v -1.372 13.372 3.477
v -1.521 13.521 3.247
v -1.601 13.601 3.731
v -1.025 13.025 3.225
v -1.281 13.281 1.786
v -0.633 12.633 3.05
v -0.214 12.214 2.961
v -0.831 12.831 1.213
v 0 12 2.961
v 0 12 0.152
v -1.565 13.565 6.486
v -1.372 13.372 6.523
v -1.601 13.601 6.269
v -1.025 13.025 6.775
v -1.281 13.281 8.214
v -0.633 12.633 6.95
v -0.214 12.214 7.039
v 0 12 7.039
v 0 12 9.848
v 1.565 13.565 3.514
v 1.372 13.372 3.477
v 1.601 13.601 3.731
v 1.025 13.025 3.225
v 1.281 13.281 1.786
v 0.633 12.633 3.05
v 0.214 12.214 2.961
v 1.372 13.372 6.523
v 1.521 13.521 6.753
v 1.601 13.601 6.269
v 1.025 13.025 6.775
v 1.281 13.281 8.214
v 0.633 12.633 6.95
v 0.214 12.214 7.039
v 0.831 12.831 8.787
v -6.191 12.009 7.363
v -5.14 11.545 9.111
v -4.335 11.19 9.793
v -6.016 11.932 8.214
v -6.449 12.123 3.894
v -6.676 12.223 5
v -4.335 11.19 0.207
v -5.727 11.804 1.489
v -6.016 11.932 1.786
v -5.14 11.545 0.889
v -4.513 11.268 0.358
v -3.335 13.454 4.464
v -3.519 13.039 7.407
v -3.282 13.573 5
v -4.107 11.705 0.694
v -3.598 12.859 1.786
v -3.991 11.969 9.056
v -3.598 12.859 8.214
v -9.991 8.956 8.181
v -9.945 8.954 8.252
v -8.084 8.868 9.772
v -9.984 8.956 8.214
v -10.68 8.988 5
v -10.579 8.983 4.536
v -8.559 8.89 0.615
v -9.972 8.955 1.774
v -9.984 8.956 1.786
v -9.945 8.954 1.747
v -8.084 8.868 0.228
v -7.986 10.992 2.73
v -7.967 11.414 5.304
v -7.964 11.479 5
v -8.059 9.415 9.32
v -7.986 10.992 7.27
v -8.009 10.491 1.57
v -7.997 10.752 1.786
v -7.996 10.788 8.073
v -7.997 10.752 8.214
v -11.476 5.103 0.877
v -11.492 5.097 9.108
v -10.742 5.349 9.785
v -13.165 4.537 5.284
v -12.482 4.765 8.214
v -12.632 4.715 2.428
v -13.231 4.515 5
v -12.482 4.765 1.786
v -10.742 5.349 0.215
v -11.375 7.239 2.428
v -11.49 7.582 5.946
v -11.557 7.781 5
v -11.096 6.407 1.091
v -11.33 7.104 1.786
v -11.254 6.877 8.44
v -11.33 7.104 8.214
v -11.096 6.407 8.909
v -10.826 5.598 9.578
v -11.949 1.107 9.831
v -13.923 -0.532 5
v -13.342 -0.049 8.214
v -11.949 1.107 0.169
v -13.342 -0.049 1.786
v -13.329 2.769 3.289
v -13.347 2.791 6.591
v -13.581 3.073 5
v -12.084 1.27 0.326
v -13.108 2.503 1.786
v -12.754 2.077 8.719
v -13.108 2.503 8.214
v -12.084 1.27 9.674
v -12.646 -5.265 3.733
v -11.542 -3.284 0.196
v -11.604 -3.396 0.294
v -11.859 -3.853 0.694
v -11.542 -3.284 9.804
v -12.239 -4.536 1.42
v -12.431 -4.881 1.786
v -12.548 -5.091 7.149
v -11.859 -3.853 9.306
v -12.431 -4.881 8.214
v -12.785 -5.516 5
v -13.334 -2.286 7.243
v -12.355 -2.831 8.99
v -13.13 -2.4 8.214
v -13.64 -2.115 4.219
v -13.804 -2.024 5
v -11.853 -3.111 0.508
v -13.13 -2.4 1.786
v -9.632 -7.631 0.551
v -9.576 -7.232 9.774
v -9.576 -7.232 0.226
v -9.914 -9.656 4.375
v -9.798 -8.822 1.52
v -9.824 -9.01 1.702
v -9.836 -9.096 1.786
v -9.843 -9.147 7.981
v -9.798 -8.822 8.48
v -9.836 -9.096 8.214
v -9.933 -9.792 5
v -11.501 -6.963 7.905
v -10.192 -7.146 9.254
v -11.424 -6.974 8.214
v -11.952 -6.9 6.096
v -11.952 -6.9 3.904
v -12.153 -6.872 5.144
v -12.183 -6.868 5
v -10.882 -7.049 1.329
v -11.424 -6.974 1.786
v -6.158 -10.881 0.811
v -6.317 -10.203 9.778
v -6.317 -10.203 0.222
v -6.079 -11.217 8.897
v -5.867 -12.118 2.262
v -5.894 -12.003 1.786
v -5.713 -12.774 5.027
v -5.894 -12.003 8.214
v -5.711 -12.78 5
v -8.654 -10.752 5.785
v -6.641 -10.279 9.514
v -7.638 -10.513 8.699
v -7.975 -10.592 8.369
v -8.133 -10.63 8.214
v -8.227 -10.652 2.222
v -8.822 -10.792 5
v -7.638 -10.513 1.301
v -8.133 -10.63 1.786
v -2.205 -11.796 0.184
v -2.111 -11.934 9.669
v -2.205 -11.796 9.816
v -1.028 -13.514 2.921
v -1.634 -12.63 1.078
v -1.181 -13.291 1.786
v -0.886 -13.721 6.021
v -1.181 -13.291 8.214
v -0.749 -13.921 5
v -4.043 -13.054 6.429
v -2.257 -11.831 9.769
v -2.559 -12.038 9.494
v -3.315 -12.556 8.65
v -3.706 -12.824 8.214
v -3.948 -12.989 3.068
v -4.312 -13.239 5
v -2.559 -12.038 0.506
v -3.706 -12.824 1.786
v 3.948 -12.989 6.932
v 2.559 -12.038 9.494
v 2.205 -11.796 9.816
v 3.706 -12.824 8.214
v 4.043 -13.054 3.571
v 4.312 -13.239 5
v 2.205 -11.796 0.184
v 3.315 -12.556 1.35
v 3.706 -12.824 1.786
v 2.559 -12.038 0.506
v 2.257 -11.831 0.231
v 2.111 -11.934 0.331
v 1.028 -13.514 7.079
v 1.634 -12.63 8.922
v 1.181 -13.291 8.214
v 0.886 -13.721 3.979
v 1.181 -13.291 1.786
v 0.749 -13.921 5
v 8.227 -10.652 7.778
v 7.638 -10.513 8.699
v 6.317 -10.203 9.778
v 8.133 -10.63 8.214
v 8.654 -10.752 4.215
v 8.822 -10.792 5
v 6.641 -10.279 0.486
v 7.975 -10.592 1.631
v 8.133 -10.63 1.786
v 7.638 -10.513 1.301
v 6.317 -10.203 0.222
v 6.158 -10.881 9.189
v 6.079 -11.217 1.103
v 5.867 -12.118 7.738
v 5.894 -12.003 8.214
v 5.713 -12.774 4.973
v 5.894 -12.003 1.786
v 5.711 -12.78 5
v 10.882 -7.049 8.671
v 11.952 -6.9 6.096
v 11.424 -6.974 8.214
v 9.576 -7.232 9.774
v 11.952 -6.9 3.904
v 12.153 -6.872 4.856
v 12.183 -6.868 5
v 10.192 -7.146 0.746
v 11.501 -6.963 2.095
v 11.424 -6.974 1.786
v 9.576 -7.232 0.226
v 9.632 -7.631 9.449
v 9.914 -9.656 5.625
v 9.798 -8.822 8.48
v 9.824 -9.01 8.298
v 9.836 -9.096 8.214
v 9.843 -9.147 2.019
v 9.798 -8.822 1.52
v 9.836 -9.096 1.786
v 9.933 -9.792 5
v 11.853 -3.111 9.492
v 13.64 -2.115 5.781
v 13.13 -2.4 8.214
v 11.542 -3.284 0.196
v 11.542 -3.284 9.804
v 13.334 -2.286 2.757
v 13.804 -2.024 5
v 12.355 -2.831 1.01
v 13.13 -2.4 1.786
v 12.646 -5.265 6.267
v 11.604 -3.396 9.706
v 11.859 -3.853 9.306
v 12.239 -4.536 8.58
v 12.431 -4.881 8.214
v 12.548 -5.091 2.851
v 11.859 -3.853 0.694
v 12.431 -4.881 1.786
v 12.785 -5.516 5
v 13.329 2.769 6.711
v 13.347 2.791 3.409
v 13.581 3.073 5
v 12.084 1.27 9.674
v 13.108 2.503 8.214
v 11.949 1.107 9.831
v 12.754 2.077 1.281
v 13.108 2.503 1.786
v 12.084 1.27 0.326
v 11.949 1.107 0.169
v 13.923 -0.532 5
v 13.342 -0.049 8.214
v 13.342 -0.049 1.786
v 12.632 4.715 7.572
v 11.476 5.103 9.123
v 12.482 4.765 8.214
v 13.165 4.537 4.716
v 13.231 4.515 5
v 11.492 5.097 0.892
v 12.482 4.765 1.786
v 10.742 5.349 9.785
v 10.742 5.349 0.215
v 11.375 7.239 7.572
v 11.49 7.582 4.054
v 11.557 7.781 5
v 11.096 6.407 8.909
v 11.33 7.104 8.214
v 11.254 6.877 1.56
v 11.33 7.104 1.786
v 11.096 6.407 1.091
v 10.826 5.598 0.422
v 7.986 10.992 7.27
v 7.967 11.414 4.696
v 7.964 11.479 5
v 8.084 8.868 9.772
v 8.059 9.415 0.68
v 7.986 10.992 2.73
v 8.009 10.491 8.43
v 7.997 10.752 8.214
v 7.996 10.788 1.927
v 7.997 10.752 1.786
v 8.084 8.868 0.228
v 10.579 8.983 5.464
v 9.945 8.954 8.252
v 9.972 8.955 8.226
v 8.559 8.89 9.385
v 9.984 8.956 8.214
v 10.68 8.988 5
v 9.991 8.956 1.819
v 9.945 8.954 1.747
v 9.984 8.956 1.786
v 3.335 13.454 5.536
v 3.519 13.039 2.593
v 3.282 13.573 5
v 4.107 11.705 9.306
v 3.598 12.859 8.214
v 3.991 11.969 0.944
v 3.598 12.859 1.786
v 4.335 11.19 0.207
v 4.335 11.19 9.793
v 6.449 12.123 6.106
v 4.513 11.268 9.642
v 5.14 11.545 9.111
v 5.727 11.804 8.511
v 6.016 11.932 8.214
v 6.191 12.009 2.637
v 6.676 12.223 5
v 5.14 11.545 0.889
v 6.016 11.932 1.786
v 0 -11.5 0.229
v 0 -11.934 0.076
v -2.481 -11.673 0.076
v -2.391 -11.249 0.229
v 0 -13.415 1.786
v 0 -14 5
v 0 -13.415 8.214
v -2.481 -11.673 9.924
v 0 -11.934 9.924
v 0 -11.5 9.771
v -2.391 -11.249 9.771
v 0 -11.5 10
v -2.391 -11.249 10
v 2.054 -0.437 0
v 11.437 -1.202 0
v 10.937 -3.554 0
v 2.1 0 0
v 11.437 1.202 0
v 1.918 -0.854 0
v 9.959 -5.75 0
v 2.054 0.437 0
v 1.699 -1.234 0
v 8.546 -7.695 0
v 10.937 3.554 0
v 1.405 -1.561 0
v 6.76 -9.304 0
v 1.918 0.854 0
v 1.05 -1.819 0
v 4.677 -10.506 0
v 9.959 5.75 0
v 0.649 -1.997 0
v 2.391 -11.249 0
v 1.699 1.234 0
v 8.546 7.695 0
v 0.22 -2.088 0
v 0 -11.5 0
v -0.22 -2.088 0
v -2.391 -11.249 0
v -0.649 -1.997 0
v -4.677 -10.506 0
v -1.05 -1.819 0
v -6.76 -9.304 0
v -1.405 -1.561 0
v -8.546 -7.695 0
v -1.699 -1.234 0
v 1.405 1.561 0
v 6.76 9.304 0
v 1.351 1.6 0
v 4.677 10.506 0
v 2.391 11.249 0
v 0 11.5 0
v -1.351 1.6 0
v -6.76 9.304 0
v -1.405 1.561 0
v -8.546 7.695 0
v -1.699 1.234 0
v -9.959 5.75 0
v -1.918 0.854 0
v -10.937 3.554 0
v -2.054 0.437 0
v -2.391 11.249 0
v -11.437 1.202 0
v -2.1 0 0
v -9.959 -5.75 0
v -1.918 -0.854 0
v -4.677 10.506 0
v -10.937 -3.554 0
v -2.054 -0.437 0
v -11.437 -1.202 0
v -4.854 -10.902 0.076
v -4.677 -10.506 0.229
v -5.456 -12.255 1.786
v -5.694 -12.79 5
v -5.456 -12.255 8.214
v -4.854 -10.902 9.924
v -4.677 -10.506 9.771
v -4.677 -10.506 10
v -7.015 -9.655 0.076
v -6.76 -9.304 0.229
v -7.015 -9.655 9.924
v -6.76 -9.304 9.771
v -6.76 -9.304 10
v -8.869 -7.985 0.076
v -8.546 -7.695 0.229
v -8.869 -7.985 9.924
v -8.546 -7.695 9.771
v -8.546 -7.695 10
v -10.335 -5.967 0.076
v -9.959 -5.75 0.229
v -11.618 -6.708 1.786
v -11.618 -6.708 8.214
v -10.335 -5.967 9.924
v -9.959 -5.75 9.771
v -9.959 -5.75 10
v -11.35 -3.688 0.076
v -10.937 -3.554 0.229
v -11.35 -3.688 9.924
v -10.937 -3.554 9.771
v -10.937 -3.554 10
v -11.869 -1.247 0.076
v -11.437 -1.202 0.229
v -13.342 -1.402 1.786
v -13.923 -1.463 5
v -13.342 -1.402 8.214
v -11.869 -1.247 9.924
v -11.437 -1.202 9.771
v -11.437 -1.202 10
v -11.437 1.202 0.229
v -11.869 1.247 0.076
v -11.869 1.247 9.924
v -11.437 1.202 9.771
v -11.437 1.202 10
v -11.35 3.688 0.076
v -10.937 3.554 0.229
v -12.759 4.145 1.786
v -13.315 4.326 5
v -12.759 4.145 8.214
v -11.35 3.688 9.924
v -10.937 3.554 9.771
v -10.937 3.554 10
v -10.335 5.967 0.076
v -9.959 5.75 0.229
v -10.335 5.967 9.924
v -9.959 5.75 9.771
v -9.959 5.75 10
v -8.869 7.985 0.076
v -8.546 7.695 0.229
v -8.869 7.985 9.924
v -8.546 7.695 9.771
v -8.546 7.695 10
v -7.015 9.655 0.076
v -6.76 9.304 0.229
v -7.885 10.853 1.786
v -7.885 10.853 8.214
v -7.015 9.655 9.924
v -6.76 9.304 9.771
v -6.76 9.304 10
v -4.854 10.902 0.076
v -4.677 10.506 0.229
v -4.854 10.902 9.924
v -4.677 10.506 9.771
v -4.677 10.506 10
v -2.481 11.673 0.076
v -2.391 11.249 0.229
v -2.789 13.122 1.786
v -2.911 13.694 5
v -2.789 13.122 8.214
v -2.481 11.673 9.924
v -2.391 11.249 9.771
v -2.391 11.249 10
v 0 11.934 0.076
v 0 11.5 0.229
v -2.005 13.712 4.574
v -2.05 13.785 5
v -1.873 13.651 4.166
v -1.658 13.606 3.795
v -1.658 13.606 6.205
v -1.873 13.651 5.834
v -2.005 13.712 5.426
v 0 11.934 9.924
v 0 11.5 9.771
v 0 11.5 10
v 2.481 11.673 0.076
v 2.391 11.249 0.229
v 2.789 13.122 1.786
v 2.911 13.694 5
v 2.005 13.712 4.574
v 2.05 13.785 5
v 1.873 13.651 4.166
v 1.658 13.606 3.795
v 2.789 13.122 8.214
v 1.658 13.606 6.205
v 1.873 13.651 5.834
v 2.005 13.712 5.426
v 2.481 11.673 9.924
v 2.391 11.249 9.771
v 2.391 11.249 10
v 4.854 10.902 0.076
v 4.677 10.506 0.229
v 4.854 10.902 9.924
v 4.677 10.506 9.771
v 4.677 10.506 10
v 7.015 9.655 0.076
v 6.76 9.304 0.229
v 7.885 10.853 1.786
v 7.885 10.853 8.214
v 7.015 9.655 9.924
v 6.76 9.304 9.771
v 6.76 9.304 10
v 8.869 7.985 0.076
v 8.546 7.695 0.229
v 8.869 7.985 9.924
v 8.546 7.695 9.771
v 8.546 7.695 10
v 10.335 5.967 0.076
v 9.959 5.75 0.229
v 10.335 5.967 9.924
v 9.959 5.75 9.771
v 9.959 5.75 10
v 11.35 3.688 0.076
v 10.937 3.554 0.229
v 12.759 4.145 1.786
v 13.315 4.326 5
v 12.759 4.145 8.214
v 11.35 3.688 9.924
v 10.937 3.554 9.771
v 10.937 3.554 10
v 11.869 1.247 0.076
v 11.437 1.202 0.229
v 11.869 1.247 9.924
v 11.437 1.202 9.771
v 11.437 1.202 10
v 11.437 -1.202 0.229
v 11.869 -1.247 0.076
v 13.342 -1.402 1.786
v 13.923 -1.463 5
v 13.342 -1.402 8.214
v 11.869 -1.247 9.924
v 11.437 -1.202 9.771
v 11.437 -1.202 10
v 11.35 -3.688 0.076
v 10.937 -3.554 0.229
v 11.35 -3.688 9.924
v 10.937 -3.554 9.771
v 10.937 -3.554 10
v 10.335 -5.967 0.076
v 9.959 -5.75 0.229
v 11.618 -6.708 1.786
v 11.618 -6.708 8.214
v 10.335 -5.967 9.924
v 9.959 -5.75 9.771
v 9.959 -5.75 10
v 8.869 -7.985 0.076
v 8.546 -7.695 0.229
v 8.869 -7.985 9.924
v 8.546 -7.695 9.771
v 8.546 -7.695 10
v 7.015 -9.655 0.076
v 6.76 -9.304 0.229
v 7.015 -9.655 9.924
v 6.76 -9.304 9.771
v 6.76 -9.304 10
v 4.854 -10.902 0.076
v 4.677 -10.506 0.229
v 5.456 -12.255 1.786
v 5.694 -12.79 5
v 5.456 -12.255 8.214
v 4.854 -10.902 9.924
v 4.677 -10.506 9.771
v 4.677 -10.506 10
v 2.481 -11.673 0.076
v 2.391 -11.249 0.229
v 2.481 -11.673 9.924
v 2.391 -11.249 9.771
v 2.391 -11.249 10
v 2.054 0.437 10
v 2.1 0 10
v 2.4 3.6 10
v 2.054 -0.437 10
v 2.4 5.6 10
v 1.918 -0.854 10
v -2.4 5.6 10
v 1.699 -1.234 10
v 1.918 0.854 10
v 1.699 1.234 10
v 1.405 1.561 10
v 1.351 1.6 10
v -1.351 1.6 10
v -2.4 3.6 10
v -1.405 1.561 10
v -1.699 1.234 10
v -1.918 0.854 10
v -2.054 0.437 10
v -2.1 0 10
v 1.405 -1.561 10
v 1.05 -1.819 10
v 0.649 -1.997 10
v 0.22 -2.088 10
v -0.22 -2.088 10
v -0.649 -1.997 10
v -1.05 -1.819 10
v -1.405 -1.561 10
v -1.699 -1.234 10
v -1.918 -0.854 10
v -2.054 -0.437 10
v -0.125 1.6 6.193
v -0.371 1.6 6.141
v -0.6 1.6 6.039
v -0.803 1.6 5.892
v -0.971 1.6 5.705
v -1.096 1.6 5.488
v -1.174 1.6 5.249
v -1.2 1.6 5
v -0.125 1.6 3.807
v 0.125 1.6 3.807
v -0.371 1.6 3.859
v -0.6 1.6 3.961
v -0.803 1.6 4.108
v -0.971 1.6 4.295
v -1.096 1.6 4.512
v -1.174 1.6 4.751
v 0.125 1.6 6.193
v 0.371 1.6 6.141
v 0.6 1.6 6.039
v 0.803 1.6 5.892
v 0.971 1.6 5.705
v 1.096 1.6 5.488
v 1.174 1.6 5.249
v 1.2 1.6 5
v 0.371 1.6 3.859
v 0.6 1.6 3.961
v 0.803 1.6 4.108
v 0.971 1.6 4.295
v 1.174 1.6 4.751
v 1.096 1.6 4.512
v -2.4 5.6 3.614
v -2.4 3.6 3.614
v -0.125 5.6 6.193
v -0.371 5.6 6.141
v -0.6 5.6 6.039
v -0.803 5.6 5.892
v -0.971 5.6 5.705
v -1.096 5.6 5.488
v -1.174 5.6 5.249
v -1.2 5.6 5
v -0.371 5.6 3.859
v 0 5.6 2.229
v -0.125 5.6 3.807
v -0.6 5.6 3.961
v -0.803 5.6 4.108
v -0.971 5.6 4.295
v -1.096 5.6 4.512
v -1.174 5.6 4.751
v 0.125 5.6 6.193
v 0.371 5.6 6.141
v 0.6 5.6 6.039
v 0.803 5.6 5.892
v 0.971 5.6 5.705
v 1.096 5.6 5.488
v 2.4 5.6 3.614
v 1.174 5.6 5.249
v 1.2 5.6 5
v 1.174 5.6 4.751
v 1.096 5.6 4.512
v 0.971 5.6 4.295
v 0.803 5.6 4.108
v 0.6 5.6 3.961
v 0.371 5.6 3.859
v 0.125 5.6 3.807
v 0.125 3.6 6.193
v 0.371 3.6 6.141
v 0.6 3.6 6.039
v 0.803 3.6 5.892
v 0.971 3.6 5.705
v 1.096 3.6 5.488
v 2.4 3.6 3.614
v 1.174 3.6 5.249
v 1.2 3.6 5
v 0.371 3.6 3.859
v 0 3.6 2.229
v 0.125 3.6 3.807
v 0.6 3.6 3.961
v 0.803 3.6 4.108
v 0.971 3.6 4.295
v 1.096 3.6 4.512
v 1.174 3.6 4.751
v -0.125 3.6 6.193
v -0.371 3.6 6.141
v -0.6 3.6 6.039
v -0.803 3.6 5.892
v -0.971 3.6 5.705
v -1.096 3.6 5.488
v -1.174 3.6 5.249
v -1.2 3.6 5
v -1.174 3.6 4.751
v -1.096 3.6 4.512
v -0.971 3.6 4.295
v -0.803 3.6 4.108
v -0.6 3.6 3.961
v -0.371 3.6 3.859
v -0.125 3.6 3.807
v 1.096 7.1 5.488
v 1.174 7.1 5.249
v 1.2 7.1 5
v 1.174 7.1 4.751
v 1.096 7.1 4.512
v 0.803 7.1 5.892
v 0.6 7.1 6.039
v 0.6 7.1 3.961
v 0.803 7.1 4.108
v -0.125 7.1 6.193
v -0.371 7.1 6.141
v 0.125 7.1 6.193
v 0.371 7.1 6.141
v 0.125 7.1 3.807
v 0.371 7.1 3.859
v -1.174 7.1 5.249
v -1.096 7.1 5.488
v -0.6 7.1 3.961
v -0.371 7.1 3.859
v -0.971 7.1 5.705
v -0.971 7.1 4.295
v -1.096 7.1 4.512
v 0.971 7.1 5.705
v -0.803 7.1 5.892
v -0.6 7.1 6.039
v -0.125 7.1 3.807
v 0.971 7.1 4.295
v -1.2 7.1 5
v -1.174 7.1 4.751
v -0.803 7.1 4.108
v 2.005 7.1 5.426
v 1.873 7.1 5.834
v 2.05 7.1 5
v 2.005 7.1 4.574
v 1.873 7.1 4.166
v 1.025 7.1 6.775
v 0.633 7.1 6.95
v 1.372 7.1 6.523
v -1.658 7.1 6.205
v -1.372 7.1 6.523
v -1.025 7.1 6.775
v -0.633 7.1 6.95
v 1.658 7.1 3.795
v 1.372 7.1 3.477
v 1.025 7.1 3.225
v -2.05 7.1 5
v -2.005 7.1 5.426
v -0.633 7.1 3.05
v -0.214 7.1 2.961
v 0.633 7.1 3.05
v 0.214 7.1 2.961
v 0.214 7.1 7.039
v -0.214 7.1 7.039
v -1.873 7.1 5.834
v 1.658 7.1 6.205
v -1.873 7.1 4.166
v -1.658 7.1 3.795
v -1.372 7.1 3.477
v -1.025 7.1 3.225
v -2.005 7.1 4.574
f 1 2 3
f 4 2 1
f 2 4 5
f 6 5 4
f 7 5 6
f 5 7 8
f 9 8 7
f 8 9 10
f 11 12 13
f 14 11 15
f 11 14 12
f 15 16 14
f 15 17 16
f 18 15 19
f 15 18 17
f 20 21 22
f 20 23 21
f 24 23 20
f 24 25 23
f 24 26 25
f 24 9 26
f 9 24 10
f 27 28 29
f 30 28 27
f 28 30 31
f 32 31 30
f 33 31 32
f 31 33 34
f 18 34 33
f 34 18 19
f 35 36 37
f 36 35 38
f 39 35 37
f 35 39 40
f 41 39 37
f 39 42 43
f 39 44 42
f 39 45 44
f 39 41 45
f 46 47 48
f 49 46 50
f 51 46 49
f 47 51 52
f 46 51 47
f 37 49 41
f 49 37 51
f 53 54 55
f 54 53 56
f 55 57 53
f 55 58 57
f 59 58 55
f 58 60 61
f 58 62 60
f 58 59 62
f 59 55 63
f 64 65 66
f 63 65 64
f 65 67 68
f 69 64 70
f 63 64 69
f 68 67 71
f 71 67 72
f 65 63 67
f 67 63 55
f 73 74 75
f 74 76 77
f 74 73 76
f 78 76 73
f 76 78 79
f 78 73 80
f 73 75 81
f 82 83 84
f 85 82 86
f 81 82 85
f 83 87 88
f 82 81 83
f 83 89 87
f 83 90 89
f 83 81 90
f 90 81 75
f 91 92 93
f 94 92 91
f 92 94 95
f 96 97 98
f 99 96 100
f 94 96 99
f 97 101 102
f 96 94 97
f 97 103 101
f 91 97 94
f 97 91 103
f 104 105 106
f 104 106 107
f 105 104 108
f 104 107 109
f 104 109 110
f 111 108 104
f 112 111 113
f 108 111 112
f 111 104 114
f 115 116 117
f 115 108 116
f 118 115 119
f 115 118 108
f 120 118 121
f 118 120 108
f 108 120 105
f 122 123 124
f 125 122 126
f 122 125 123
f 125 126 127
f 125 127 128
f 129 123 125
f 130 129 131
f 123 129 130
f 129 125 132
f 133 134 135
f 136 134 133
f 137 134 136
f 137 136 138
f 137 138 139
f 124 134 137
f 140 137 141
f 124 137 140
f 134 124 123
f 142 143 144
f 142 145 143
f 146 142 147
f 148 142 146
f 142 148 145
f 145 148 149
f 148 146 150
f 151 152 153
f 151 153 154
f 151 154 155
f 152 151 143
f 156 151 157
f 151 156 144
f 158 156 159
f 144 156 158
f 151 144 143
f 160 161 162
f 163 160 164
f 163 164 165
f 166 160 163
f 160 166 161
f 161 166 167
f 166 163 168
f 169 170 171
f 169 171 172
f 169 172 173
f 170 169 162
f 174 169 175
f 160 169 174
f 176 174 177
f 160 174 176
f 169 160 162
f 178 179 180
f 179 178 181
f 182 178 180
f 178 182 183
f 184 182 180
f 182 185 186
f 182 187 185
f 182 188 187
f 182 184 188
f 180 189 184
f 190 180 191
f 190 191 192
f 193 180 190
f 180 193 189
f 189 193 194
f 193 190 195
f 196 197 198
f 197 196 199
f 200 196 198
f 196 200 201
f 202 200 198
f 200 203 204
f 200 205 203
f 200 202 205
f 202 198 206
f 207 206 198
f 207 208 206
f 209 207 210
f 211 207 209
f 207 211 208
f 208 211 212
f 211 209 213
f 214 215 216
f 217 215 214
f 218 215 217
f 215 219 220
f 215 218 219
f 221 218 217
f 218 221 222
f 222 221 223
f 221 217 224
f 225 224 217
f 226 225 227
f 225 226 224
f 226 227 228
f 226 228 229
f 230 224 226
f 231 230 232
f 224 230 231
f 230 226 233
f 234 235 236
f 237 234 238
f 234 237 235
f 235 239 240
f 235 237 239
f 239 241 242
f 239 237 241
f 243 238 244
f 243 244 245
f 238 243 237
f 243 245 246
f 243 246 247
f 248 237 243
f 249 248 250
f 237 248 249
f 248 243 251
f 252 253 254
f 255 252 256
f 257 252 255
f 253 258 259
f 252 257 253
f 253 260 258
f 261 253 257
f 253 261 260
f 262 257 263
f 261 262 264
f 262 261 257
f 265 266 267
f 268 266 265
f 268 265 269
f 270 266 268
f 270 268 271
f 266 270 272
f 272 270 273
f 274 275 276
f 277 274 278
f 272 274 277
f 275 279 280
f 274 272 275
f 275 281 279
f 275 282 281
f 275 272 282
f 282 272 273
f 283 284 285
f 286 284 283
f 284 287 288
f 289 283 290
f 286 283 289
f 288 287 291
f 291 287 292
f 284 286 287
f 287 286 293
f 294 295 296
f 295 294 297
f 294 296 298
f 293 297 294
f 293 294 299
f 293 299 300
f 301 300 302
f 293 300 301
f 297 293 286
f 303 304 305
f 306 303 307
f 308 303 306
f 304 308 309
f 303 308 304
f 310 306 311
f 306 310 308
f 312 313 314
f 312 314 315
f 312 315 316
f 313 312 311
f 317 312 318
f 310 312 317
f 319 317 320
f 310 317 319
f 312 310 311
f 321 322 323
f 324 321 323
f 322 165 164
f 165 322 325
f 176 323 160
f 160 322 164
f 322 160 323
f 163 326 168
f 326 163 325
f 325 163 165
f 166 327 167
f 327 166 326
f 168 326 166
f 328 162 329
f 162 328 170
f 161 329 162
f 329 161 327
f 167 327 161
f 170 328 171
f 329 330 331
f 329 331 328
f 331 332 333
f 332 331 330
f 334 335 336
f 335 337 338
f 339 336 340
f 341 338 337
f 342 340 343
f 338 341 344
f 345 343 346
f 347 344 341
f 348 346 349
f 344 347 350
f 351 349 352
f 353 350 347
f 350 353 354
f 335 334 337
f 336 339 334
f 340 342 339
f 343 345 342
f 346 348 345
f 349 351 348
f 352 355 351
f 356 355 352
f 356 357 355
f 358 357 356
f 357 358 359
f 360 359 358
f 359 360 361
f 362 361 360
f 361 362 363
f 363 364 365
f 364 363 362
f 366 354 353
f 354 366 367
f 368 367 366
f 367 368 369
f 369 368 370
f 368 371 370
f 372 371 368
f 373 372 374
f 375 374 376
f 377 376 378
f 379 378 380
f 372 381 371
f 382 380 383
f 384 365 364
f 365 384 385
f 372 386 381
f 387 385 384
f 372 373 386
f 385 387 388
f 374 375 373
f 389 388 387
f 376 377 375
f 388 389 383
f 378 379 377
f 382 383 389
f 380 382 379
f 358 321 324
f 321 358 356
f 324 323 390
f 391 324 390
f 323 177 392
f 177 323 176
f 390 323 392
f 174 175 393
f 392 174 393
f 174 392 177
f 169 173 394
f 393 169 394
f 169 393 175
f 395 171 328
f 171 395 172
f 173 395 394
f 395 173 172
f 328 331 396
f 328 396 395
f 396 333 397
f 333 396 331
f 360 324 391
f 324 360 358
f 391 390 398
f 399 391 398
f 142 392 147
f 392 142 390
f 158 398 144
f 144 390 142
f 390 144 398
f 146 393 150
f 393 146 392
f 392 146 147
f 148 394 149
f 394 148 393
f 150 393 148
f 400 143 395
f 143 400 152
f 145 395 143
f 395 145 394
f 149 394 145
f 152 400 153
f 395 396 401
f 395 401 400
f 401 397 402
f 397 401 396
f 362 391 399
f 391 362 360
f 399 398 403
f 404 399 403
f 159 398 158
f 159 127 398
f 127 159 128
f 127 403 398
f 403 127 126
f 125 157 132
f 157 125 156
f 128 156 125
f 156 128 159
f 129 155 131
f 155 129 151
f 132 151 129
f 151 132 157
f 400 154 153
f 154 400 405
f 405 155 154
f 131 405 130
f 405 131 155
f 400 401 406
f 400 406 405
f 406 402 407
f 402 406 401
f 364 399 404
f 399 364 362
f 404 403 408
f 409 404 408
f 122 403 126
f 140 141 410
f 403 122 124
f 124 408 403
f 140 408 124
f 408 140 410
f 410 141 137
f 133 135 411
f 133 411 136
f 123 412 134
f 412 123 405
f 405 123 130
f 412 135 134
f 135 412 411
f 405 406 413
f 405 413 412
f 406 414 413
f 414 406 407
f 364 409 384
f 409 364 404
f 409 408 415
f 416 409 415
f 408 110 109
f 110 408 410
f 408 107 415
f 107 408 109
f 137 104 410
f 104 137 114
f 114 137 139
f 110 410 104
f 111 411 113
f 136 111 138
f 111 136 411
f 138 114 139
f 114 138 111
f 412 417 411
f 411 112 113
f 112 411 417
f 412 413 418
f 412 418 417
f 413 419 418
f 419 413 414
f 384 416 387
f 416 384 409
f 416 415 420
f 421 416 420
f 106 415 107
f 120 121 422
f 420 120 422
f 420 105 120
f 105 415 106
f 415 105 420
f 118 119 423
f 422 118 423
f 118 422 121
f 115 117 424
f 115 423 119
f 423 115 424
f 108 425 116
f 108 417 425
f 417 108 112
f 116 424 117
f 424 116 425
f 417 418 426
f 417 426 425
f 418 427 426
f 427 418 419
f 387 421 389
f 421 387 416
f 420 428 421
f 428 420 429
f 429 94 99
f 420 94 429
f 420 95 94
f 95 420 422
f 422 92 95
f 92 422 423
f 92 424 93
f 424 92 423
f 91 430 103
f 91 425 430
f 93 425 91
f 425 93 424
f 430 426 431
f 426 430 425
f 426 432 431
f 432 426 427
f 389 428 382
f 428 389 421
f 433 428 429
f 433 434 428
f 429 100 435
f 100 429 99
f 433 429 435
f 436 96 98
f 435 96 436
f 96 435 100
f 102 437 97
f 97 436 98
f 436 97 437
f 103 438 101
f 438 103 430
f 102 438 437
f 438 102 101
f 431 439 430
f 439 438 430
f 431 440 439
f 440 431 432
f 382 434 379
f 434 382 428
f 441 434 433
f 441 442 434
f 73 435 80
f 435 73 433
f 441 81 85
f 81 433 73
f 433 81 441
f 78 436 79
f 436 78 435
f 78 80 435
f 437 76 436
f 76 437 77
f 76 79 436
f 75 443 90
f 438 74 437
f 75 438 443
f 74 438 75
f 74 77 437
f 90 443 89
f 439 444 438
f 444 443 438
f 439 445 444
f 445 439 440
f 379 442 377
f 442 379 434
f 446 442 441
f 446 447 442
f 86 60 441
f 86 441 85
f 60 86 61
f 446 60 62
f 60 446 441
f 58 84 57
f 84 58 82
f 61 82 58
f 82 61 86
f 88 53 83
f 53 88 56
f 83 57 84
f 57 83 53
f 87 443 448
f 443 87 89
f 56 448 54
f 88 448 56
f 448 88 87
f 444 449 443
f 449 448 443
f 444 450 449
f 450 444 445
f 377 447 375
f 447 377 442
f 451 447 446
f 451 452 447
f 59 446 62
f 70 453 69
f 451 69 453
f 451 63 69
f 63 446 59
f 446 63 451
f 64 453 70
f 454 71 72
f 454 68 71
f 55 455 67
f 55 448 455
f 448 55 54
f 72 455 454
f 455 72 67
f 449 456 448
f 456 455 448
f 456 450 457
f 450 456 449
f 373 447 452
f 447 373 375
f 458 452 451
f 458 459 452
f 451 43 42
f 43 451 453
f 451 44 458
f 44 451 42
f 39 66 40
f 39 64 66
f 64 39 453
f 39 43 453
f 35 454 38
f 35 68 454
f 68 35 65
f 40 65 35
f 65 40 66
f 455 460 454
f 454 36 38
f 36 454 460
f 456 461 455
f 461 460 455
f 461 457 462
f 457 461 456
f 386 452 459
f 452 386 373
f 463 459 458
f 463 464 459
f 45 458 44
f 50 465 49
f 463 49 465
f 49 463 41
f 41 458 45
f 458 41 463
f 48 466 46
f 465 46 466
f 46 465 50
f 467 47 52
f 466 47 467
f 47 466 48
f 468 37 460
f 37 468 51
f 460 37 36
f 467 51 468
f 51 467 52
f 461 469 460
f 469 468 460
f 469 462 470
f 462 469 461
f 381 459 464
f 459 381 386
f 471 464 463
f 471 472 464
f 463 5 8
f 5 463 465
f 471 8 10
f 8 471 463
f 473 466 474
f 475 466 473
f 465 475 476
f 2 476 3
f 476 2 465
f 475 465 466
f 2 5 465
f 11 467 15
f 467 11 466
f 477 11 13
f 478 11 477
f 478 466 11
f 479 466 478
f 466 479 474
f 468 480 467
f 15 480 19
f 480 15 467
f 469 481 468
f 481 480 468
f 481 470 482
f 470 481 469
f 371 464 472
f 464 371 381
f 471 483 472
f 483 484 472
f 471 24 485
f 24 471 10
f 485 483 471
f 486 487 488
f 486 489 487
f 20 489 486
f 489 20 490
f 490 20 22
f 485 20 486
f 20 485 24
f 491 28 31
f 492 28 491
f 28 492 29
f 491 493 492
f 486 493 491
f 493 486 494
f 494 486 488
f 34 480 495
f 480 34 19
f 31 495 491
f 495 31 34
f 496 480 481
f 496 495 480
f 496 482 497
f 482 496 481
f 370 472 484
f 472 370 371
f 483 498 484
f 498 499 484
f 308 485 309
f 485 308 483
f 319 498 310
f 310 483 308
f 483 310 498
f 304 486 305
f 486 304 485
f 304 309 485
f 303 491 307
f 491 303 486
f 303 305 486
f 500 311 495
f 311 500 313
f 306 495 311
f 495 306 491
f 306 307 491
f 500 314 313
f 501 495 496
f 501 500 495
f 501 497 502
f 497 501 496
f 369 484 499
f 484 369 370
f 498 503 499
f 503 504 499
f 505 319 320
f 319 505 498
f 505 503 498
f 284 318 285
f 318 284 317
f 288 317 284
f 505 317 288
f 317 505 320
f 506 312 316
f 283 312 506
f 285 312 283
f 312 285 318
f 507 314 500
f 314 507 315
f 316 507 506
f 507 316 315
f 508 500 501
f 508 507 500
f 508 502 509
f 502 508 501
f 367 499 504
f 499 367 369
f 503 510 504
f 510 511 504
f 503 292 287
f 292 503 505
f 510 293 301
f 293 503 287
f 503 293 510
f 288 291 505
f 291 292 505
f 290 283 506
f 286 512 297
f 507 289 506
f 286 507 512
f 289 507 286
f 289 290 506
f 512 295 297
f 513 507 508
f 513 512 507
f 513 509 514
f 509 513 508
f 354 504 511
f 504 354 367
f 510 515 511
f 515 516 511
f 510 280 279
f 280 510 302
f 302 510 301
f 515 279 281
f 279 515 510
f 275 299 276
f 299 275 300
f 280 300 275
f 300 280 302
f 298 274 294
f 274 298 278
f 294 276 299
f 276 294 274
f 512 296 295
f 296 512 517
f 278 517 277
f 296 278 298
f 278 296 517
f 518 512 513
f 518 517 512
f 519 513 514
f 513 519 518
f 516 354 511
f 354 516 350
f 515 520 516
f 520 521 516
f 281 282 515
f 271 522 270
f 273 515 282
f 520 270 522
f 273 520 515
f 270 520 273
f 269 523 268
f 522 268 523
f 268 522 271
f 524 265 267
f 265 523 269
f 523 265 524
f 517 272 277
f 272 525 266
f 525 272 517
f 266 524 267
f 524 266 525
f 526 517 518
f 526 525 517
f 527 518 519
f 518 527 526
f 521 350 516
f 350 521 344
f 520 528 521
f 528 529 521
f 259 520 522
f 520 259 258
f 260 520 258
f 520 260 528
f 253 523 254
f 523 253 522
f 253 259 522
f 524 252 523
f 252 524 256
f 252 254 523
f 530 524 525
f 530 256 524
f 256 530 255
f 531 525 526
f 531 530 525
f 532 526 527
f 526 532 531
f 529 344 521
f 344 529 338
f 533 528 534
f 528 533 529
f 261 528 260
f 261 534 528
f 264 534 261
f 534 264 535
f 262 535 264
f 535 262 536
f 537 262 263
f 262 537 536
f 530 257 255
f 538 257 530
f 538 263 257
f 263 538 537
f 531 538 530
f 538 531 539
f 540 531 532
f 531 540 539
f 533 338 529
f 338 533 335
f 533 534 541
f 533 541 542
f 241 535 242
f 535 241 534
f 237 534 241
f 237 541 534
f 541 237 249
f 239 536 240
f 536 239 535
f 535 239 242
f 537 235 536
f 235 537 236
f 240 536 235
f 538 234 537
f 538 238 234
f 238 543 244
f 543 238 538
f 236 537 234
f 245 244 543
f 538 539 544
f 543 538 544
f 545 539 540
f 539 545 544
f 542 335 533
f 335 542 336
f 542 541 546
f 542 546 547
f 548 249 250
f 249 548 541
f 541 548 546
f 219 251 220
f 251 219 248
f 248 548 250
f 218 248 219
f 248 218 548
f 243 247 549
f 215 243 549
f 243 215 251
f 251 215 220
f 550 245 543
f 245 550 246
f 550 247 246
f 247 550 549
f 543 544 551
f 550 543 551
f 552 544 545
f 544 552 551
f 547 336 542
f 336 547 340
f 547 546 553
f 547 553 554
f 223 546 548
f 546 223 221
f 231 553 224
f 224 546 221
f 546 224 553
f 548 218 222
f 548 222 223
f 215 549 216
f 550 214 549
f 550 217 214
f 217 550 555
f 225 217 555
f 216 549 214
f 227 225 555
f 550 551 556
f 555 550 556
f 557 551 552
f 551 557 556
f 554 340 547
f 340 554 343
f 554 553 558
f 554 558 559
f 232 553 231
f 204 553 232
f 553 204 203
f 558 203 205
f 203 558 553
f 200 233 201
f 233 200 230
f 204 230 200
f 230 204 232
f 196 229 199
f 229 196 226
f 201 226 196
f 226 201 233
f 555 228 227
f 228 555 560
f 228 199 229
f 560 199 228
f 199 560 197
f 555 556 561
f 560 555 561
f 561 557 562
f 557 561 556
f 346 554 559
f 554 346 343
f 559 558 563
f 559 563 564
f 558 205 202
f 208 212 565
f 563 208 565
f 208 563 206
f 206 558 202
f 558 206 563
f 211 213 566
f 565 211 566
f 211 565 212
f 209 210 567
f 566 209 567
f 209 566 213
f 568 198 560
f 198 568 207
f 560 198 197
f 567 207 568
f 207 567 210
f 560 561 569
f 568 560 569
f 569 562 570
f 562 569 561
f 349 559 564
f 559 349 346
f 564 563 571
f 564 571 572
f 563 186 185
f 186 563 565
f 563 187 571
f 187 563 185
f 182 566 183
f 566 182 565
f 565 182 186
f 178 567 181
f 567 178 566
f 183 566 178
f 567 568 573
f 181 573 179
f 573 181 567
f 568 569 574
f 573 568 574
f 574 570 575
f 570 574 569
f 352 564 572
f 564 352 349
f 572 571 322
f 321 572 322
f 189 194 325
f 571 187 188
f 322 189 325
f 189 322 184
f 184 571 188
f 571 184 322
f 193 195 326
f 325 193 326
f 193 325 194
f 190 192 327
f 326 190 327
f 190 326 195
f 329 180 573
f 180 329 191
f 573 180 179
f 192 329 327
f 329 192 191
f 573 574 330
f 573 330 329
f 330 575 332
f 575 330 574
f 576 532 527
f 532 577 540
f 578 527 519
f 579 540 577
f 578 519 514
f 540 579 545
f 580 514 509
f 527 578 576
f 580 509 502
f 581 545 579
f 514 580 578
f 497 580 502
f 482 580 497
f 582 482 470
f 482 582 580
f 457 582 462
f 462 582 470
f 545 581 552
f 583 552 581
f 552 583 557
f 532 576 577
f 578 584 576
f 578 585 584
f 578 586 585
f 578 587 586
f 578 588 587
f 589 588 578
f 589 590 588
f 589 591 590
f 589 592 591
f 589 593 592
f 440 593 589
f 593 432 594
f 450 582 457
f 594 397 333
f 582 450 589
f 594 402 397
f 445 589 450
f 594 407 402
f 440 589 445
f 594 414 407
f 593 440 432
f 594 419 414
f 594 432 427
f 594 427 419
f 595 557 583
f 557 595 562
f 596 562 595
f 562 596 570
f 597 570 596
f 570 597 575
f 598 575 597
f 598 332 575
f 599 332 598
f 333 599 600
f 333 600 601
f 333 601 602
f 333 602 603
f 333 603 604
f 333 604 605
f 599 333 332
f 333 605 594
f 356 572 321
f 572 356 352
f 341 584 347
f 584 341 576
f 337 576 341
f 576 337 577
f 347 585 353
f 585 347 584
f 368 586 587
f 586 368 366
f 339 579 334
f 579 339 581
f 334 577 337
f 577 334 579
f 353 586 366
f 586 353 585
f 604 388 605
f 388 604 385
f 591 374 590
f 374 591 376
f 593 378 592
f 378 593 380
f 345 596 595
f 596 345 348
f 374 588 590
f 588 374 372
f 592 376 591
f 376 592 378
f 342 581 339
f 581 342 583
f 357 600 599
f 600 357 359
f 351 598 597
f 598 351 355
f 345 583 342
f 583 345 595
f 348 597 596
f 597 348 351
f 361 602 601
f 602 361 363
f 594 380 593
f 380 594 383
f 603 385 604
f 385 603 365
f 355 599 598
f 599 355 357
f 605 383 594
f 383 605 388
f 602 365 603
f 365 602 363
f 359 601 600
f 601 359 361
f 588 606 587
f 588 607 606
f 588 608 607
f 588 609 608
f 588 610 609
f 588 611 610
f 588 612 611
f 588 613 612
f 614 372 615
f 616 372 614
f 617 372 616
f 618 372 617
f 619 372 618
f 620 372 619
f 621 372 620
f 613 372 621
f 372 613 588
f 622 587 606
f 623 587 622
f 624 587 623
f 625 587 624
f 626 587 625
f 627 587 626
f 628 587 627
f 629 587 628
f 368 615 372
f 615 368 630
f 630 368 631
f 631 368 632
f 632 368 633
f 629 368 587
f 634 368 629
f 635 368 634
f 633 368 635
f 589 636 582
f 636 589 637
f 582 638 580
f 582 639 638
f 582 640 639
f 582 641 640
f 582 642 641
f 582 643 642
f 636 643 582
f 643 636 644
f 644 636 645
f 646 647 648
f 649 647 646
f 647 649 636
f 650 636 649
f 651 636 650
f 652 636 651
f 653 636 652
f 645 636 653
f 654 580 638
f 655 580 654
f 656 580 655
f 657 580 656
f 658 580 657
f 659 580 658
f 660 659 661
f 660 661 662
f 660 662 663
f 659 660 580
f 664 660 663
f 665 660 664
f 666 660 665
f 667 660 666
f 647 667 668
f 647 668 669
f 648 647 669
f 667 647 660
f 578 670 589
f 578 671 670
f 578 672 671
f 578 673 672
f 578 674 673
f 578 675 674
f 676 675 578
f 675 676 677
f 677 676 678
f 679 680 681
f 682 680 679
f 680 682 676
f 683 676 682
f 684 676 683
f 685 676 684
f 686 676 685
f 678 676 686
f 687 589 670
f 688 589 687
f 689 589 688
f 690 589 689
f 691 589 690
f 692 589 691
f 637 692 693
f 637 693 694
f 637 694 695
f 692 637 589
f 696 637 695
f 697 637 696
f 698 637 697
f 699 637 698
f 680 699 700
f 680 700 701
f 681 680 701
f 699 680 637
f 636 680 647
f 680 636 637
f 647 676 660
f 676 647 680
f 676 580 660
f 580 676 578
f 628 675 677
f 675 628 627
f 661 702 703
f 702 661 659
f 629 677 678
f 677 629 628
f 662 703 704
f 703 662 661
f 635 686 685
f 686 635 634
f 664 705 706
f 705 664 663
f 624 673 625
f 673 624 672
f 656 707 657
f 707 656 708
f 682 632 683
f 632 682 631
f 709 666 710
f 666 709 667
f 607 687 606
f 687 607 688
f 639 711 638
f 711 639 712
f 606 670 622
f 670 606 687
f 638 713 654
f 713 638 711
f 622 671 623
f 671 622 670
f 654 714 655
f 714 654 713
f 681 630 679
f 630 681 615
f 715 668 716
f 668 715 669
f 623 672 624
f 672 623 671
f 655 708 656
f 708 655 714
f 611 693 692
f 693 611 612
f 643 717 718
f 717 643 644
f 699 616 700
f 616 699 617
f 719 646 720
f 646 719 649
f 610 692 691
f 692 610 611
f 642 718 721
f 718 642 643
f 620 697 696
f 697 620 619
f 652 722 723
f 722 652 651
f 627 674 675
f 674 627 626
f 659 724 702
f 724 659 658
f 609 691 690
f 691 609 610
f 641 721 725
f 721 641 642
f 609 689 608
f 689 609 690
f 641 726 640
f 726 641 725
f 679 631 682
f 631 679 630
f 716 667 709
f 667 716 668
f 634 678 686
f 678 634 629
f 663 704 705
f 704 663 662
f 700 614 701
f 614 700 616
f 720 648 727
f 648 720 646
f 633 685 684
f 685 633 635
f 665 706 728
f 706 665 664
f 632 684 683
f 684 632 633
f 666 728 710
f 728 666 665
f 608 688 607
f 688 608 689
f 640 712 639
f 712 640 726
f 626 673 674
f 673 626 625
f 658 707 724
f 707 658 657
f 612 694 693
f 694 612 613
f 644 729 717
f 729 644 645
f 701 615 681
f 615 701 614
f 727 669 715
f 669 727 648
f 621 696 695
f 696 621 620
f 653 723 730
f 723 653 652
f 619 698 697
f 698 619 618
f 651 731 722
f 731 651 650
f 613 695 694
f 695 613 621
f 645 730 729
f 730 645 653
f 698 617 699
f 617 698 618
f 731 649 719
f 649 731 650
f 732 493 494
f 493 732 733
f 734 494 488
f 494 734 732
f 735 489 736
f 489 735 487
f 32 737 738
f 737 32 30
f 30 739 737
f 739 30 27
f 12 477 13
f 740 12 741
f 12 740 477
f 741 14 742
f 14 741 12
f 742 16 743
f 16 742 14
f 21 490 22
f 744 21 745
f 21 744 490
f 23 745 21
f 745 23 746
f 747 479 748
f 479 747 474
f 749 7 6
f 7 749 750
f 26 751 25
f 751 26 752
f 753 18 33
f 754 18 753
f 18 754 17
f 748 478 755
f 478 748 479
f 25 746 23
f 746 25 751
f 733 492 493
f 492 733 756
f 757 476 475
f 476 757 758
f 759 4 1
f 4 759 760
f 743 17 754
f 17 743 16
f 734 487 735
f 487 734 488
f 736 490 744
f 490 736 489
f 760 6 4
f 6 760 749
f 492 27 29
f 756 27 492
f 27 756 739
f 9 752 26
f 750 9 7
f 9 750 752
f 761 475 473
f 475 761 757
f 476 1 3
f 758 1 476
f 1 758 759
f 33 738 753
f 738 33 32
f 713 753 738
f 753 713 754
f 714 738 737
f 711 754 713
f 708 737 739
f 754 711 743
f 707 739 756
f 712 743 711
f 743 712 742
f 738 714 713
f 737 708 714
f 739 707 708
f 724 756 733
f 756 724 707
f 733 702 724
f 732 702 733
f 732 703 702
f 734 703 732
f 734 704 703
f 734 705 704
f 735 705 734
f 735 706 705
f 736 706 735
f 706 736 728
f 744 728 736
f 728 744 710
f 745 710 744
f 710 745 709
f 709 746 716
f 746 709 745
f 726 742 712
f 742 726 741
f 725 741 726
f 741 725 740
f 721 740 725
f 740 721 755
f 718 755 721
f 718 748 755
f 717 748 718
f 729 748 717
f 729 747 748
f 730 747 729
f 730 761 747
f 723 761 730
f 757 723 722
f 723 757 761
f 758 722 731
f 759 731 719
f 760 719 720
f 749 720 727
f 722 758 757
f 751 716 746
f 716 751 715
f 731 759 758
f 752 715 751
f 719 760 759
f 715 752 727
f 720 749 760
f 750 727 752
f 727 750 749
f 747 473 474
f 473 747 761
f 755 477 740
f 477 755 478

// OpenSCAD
// file: ../nuts.scad
include <settings.scad>;

module make_hex_nut(w, h, d=0){
    // d = inner diameter
    // w = width across the flats
    // h = height or thickness
    s = w/sqrt(3);
    difference(){
        union(){
            for(i=[0:1:2]){
                rotate([0,0,120*i])
                cube([w, s, h], center=true);
            }
        }
        if(d){
            cylinder(d=d, h=h+1, center=true);
        }
    }
}

//make_hex_nut(w=5, h=2, d=2.5);

module make_nut_2(d=2){
    make_hex_nut(w=4.8, h=2, d=d);
}

module make_nut_w4_h1p5(d=2){
    make_hex_nut(w=4, h=1.5, d=d);
}

module make_nut_2_5(d=2, h=3.5){
    make_hex_nut(w=5+tolerance/2, h=h, d=d);
}

module make_nut_2_5_test(){
    difference(){
        translate([0,0,-.5])
        cube([10,10,2], center=true);
        make_nut_2_5(d=0);
    }
}

module make_nut_2_5_test_downward(){
    difference(){
        translate([0,0,1])
        cube([10,10,2*2.5], center=true);
        color("red")
        make_nut_2_5(d=0);
        color("blue")
        cylinder(d=screw_thread_diameter, h=10, center=true);
    }
}

module make_nut_2_5_test_punchout(){
    difference(){
        translate([0,0,1.5])
        cube([10,10,2*1.5], center=true);
        color("red")
        make_nut_2_5(d=0);
        color("blue")
        cylinder(d=screw_thread_diameter, h=10, center=true);
    }
    color("green")
    translate([0,0,1.8])
    cube([10,10,track_punchout_thickness], center=true);
}

//make_nut_2_5_test();
make_nut_w4_h1p5();
//make_nut_2_5_test_downward();
//make_nut_2_5_test_punchout();
// file: flexiTreads.scad
// Robot tracks w/ flexible fillament
// hristo.staykov@gmail.com

pi = 3.141592653589793238;

//Calculate the variables bellow based on your requirements
//Note that by changing any values, you may also need to compute perfectWheelRadius manually.

trackWidth = 13.5;
trackOffset = 3;        //distance from chassis

wheelRadius = 19;//13.5; //includes the "sprokets" on the wheel

wheelWidth = trackWidth;//8;
wheelOffset = trackOffset + (trackWidth-wheelWidth)/2;
wheelSpacing = 40;//70;
wheelTeeth = 27;//TODO:vary based on wheelSpacing?
wheelSprockets = 17;

// C=2*pi*R + 2*flat
trackLength = 2*wheelRadius*pi + 2*wheelSpacing;

//trackLength = 210;    //Sillicone bracelets usualy have a circumference of 210mm and width of 12mm and can serve as a replacement for the printed tracks. If using a hard-coded value for trackLength, make sure to reflect changes on wheelSpacing.
//wheelSpacing = (trackLength - 2*wheelRadius*3.141592653589793238)/2;

trackRadius = trackLength/2/pi;
trackSprockets = round(wheelSprockets * trackRadius / wheelRadius);

perfectWheelRadius = wheelRadius;//13.5175311111111;  //the closest value to wheelRadius where the wheel sprockets and the track's ones are about the same size.
//TODO: Compute this automatically

//Bolts used for attaching wheels

boltDiameter = 3;	//M3, DIN912, like printrbot's ones
boltHeadHeight = 3;
boltHeadDiameter = 5.5;
boltLength=30;//excl. head
boltUnthreadedSegment=boltLength-18;


module wheel(r, w, offset, motor){
    //Set `motor` to true in order to include a 3mm D-shaft for attaching to pololu micro gearmotors
    inset=2;
    difference(){
	union(){
            rotate_extrude(convexity = 10)
		union(){
			square([r-w/4, w]);
			translate([r-w*1/4, w/2, 0])scale([0.5, 1, 1])circle(w/2, $fn=9);
		}
            difference(){
                translate([0, 0, w])cylinder(r1=5, r2=3, h=offset);
                if(!motor){
                    //cut space for a nut and a washer
                    translate([0, 0, w+offset-3])cylinder(r=5, h=3);
                }
            }//end diff

	}
	union(){
/*
            if (motor){
		translate([0, 0, w+offset-9])motorShaft();
		//the motor wheel will be connected with a module for additional support
            }else{
		
		cylinder(r=1.7, h=offset+w, $fn=32);
		cylinder(r=boltHeadDiameter/2+1, h=(wheelWidth+wheelOffset-boltUnthreadedSegment-3)+1, $fn=32);
		//1 extra mm for a washer
            }
*/

            for(i=[0:wheelSprockets]){
		rotate([0, 0, i*360/wheelSprockets])translate([r, 0, 0])cylinder(r=sprocketSize/2, h=w, $fn=4);
            }
	}	
    }//end diff
}
module wheelCap(inset, width, radius){
	cylinder(h=inset+width, r=5.5/2);
	cylinder(h=width, r=radius);
}
module helperWheel(r, w, wall, offset){
	cylinder(r=r, h=w);
	translate([0, 0, -1])cylinder(r=r+wall, h=1);

}
module motorShaft(){
    //3mm D-shaft for pololu micro gearmotors
    difference(){
	cylinder(h=9,r=1.7, $fn=64);
	translate([-5, 1.25, 0])cube(10);
    }
}


sprocketSize = 4;
module track(r, w=0, fullTrackWidth=0, gripSize=1, gripWidth=0, teeth=0, wr=0, ws=0){
    //Print with flexible fillament
    
    fullTrackWidth = fullTrackWidth ? fullTrackWidth : trackWidth;
    
    C = 2*r*pi;
    //gripSize = 1;//mm
    gripCount = floor(C/2/gripSize);
    //teeth = r;
    teeth = teeth ? teeth : r;
    wr = wr ? wr : wheelRadius;
    ws = ws ? ws : wheelSprockets;
    gripWidth = gripWidth ? gripWidth : fullTrackWidth-2;

    //trackRadius = trackLength/2/pi;
    trackSprockets = round(ws * r / wr);

    echo("fullTrackWidth:", fullTrackWidth);
    difference(){
        cylinder(r=r+1, h=fullTrackWidth, $fn=gripCount);
        cylinder(r=r-w/4, h=fullTrackWidth, $fn=trackSprockets);
        cylinder(r1=r-0.5,r2=r-w/4, h=(fullTrackWidth-w)/2, $fn=trackSprockets);
        translate([0, 0, fullTrackWidth-(fullTrackWidth-w)/2])cylinder(r2=r-0.5,r1=r-w/4, h=(fullTrackWidth-w)/2, $fn=trackSprockets);
        translate([0, 0,  (fullTrackWidth-w)/2]) rotate_extrude(convexity = 10)
		union(){
			square([r-w/4, w]);
			translate([r-w*1/4, w/2, 0])scale([0.5, 1, 1])circle(w/2, $fn=9);
		}
    }//end diff

    translate([0, 0, (fullTrackWidth-w)/2])
        intersection(){
            for(i=[0:trackSprockets]){
		rotate([0, 0, i*360/trackSprockets])translate([r-w*1/4+sprocketSize/2, 0, 0])scale([1, 0.72, 1])cylinder(r=sprocketSize/2, h=w, $fn=4);
            }
            cylinder(r=r, h=w);
        }
    for(i=[0:gripCount]){
        rotate([0, 0, i*360/gripCount])
        translate([r+1, 0, -gripWidth/2+fullTrackWidth/2])
        cylinder(r=gripSize/2, h=gripWidth, $fn=12);
    }

}


//track(trackRadius, wheelWidth);

/*
//mock tread to compare with tread cutout
translate([0,0,50])
color("red")
cylinder(r=trackRadius-.65, h=10, center=true);
*/

translate([0,0,0])wheel(perfectWheelRadius, wheelWidth, wheelOffset, false);

/*
translate([-wheelRadius-2,0,0])
wheel(perfectWheelRadius, wheelWidth, wheelOffset, false);
*/

/*
//mock wheel to compare with spoked wheel
translate([0,0,50])
color("red")
cylinder(r=wheelRadius, h=10, center=true);
*/
// file: ../settings.scad
// Common settings used by all scad files.

// ALL UNITS IN MILLIMETERS (MM)!!!

$fn = 30;//low-res but fast to render
//$fn = 50;//higher-res but slow to render

pi = 3.1415926535897932384626433832795;

max_footprint = 150; // 15x15 cm

bottom_clearance = 10;
bottom_clearance = 25.4/2+10;
//bottom_clearance = 30;

shell_alpha = 0.215;
//shell_alpha = 1.0;

tolerance = 0.5;

// Flat countersunk M2.5mm x 0.45mm machine screw.
screw_thread_diameter = 2.5;//2.8;//2.75;//2.4?
screw_thread_length = 5;//?
screw_head_diameter = 4.75; // M2.5
//screw_head_diameter = 5.2; // M3
screw_head_height = 1.5;//2;

screw_thread_diameter2 = 2;

unit_thickness = 5;
u = unit_thickness;

shell_thickness = unit_thickness;

// Show flags.
show_platform = 0;
show_head = 1;
show_head_shell = 0;
show_head_electronics_bb = 0;
show_battery = 1;
show_foot_cube = 0;
show_torso = 0;
show_motor = 0;
show_motor_plates = 1;
show_motor_inner_plates = 1;
show_motor_outer_plates = 1;
show_wheel = 0;//obsolete
show_tracks = 1;//
show_track_wheels = 1;
show_caster = 0;
show_rpi = 1;
show_vertical_plates = 1;//
show_horizontal_plates = 1;//
show_caster_plates = 0;//obsolete?
show_camera = 1;
show_screen = 0;
show_edge_mount = 1;
show_sonar_mount = 1;
show_recharge_mount = 1;
show_conduit = 1;
show_torso_shell = 1;
show_recharge_dock = 0;
show_head_tilt_axis = 0;
show_rpi_camera_axis = 0;
show_laser_axis = 0;

head_vertical_angle_tilt = 0;
//head_vertical_angle_tilt = 30;//max
//head_vertical_angle_tilt = 10;

torso_height = 120+20;

base_plate_diameter = max_footprint-unit_thickness*2;
base_plate_frame = 0;

head_height = 50;
head_offset_z = max_footprint/2;
head_middle_cutout = 85;

rpi_with_four_hats_and_clearance = 76;

qrd1114_w = 6.10;
qrd1114_l = 4.39;
qrd1114_h = 4.65;

dock_radius = 10;
dock_gripper_border = 2;
dock_gripper_instep = 0.9;
dock_gripper_cutout_tapper = 50;
dock_receiver_height = 5;

// Patriod Fuel+ 9000 mAh
battery_length = 90;
battery_width = 57;
battery_height = 23;
battery_offset_z = 30;//4;

wheel_diameter = 50;
wheel_offset_x = 65;
wheel_offset_z = wheel_diameter/2;
wheel_axle_diameter = 5;

//caster_diameter = 19.05; // 0.75 inches
caster_diameter = 25.45; // 1 inches
//caster_diameter = 15.875; // 5/8 inches
caster_holder_diameter = 30;//31;
caster_offset_y = base_plate_diameter/2 - caster_holder_diameter/2;

arduino_offset_x = 0;
arduino_offset_y = 0;
arduino_offset_z = 67;
arduino_offset_x2 = 0;
arduino_offset_y2 = -20;
arduino_offset_z2 = torso_height+bottom_clearance;

horizontal_plate_width = unit_thickness*8*2 - unit_thickness*2;
horizontal_plate_depth = unit_thickness*8*2;

vertical_plate_width = horizontal_plate_depth;
vertical_plate_height = unit_thickness*8;
vertical_plate_offset_x = wheel_offset_x-22.5;
vertical_plate_offset_z = vertical_plate_height/2 + unit_thickness/2;

vertical_battery_plate_height = 100 - 15;

caster_plate_width = horizontal_plate_width + unit_thickness*2;
caster_plate_mount_length = unit_thickness*4;
caster_plate_width_minor = caster_holder_diameter;

motor_switch_length = 20;
motor_switch_thickness = 6.5;
motor_switch_height = 11;
motor_switch_height_leads = 23;
motor_switch_on_height =  13.3;
motor_switch_hole_diameter = 2.5;
motor_switch_hole_offset_z = 6.5;//this plus diameter/2 is hole center from switch top
motor_switch_hole_spacing = 7.1;// holes are diameter/2 from this

motor_length = 60;
motor_width = 25;
motor_collar_width = 7;
motor_collar_height = 2.5;
motor_axle_width = 4;
motor_axle_height = 9.5;
motor_offset_x = 10;
//motor_offset_y = motor_width/2+5;
motor_offset_y = unit_thickness*3.5;
motor_offset_z = vertical_plate_height/2 - unit_thickness/2;//4;//30;
motor_mount_holes_dist = 17;
// motor countersink hole
motor_mount_holes_width = 3; // M3
motor_mount_holes_head_height = 2.2;
motor_mount_holes_head_width = 5.8;
motor_bearing_outer_diameter = 10;
motor_bearing_inner_diameter = 5.95;
motor_bearing_thickness = 2.5;

motor_unimount_idler_axle_d = screw_thread_diameter;
//motor_unimount_spacer_depth = 0.1;//too small
motor_unimount_spacer_depth = 0.5;

motor_arm_offset_y = -u*3;
motor_arm_offset_z = u*.5;

motor_plate_width = vertical_plate_width;
motor_plate_height = vertical_plate_height;
motor_plate_thickness = unit_thickness;
motor_plate_offset_z = vertical_plate_offset_z;

motor_plate_middle_thickness = 5;

wheel_hub_offset = u*3;

motor_hole_height_offset = -5;

nylon_spacer_outer_diameter = 6.35;
nylon_spacer_inner_diameter = 3.302;
nylon_spacer_length = 12.7;

track_width = unit_thickness*3;
track_offset_x = -50;
track_offset_z = .1;
//track_wheel_radius = 19;//original
track_wheel_radius = 14;
//track_wheel_hole_radius = (nylon_spacer_outer_diameter+1)/2;
track_wheel_hole_radius = motor_bearing_outer_diameter/2;

track_driver_hole_radius = (motor_axle_width)/2 + 0.1;
track_driver_set_screw_head_d = 4.1;
track_driver_set_screw_shaft_d = 2.4;
//track_wheel_width = 13.5;//original
track_wheel_width = u*2;
track_wheel_width_buffer = u*0.25;
track_offset = 3;        //distance from chassis
track_wheel_offset = track_offset;
//track_length = 250; // see tread_triangle.py, too big
//track_length = 240; // see tread_triangle.py
//track_length = 238; //inc/dec in 10 unit increments so notches match idlers
track_length = 228; //inc/dec in 10 unit increments so notches match idlers
track_radius = track_length/2/pi;
track_wheel_show_fancy = 1;
track_wheel_gap = track_wheel_width + track_wheel_width_buffer*2;
track_axle_bearing_diameter = motor_bearing_inner_diameter - 0.1;
track_tensioner_radius = 12;
track_nut_height = 3.5; //TODO
track_punchout_thickness = 0.25;//should be the same as the minimum layer thickness

head_slew_bearing_outer_diameter = 115;
head_slew_bearing_ring_thickness = 20;
head_slew_bearing_inner_diameter = head_slew_bearing_outer_diameter - head_slew_bearing_ring_thickness;
//head_slew_bearing_hole_diameter = head_slew_bearing_inner_diameter - head_slew_bearing_ring_thickness;
head_slew_bearing_hole_diameter = 12+tolerance; // slip ring https://www.adafruit.com/products/775
//head_slew_bearing_ball_diameter = 5;
head_slew_bearing_ball_diameter = 2.5; //u/2;
head_slew_bearing_height = u;//head_slew_bearing_ball_diameter*2;
head_slew_bearing_gap = 0.5;
head_slew_bearing_slew_gap = 0;
head_slew_bearing_gap_factor = 0.1;

neck_strut_width = u*7;
neck_strut_height = u*18;
neck_strut_spacing = u*8;

show_outer_race = 0;
show_inner_race_a = 1;
show_inner_race_b = 1;
show_balls = 0;
// main file
include <../settings.scad>;
use <flexiTreads.scad>;
use <../nuts.scad>;

module make_track_driver(){

	notch_depth = 0.5;

	difference(){
        difference(){
			rotate([0,0,90])
		    if(track_wheel_show_fancy){		
                wheel(track_wheel_radius, track_wheel_width, track_wheel_offset, false);
		    }else{
		        cylinder(d=track_wheel_radius*2, h=track_wheel_width, center=false);
		    }

			difference(){
	            cylinder(d=track_driver_hole_radius*2, h=track_wheel_width*10, center=true);
				color("blue")
				translate([0,track_driver_hole_radius*3/2+track_driver_hole_radius-notch_depth,0])
				cube([track_driver_hole_radius*3,track_driver_hole_radius*3,track_wheel_width*20], center=true);
			}

        }

	// set screw cutout
	translate([0,track_driver_hole_radius+2.5,track_wheel_width/2]){
		rotate([90,0,0]){
			color("red")
			hull(){
				make_nut_2(w=6, d=0);
				translate([0,10,0])
				make_nut_2(w=6, d=0);
			}
		}
		color("green")
		translate([0,track_wheel_radius/2-4,0])
		rotate([90,0,0])
		cylinder(d=track_driver_set_screw_shaft_d, h=track_wheel_radius, center=true);
		
		color("blue")
		translate([0,track_wheel_radius/2-1,0])
		rotate([90,0,0])
		cylinder(d=track_driver_set_screw_head_d, h=track_wheel_radius/2, center=true);
	}

	}// end diff


}

make_track_driver();
